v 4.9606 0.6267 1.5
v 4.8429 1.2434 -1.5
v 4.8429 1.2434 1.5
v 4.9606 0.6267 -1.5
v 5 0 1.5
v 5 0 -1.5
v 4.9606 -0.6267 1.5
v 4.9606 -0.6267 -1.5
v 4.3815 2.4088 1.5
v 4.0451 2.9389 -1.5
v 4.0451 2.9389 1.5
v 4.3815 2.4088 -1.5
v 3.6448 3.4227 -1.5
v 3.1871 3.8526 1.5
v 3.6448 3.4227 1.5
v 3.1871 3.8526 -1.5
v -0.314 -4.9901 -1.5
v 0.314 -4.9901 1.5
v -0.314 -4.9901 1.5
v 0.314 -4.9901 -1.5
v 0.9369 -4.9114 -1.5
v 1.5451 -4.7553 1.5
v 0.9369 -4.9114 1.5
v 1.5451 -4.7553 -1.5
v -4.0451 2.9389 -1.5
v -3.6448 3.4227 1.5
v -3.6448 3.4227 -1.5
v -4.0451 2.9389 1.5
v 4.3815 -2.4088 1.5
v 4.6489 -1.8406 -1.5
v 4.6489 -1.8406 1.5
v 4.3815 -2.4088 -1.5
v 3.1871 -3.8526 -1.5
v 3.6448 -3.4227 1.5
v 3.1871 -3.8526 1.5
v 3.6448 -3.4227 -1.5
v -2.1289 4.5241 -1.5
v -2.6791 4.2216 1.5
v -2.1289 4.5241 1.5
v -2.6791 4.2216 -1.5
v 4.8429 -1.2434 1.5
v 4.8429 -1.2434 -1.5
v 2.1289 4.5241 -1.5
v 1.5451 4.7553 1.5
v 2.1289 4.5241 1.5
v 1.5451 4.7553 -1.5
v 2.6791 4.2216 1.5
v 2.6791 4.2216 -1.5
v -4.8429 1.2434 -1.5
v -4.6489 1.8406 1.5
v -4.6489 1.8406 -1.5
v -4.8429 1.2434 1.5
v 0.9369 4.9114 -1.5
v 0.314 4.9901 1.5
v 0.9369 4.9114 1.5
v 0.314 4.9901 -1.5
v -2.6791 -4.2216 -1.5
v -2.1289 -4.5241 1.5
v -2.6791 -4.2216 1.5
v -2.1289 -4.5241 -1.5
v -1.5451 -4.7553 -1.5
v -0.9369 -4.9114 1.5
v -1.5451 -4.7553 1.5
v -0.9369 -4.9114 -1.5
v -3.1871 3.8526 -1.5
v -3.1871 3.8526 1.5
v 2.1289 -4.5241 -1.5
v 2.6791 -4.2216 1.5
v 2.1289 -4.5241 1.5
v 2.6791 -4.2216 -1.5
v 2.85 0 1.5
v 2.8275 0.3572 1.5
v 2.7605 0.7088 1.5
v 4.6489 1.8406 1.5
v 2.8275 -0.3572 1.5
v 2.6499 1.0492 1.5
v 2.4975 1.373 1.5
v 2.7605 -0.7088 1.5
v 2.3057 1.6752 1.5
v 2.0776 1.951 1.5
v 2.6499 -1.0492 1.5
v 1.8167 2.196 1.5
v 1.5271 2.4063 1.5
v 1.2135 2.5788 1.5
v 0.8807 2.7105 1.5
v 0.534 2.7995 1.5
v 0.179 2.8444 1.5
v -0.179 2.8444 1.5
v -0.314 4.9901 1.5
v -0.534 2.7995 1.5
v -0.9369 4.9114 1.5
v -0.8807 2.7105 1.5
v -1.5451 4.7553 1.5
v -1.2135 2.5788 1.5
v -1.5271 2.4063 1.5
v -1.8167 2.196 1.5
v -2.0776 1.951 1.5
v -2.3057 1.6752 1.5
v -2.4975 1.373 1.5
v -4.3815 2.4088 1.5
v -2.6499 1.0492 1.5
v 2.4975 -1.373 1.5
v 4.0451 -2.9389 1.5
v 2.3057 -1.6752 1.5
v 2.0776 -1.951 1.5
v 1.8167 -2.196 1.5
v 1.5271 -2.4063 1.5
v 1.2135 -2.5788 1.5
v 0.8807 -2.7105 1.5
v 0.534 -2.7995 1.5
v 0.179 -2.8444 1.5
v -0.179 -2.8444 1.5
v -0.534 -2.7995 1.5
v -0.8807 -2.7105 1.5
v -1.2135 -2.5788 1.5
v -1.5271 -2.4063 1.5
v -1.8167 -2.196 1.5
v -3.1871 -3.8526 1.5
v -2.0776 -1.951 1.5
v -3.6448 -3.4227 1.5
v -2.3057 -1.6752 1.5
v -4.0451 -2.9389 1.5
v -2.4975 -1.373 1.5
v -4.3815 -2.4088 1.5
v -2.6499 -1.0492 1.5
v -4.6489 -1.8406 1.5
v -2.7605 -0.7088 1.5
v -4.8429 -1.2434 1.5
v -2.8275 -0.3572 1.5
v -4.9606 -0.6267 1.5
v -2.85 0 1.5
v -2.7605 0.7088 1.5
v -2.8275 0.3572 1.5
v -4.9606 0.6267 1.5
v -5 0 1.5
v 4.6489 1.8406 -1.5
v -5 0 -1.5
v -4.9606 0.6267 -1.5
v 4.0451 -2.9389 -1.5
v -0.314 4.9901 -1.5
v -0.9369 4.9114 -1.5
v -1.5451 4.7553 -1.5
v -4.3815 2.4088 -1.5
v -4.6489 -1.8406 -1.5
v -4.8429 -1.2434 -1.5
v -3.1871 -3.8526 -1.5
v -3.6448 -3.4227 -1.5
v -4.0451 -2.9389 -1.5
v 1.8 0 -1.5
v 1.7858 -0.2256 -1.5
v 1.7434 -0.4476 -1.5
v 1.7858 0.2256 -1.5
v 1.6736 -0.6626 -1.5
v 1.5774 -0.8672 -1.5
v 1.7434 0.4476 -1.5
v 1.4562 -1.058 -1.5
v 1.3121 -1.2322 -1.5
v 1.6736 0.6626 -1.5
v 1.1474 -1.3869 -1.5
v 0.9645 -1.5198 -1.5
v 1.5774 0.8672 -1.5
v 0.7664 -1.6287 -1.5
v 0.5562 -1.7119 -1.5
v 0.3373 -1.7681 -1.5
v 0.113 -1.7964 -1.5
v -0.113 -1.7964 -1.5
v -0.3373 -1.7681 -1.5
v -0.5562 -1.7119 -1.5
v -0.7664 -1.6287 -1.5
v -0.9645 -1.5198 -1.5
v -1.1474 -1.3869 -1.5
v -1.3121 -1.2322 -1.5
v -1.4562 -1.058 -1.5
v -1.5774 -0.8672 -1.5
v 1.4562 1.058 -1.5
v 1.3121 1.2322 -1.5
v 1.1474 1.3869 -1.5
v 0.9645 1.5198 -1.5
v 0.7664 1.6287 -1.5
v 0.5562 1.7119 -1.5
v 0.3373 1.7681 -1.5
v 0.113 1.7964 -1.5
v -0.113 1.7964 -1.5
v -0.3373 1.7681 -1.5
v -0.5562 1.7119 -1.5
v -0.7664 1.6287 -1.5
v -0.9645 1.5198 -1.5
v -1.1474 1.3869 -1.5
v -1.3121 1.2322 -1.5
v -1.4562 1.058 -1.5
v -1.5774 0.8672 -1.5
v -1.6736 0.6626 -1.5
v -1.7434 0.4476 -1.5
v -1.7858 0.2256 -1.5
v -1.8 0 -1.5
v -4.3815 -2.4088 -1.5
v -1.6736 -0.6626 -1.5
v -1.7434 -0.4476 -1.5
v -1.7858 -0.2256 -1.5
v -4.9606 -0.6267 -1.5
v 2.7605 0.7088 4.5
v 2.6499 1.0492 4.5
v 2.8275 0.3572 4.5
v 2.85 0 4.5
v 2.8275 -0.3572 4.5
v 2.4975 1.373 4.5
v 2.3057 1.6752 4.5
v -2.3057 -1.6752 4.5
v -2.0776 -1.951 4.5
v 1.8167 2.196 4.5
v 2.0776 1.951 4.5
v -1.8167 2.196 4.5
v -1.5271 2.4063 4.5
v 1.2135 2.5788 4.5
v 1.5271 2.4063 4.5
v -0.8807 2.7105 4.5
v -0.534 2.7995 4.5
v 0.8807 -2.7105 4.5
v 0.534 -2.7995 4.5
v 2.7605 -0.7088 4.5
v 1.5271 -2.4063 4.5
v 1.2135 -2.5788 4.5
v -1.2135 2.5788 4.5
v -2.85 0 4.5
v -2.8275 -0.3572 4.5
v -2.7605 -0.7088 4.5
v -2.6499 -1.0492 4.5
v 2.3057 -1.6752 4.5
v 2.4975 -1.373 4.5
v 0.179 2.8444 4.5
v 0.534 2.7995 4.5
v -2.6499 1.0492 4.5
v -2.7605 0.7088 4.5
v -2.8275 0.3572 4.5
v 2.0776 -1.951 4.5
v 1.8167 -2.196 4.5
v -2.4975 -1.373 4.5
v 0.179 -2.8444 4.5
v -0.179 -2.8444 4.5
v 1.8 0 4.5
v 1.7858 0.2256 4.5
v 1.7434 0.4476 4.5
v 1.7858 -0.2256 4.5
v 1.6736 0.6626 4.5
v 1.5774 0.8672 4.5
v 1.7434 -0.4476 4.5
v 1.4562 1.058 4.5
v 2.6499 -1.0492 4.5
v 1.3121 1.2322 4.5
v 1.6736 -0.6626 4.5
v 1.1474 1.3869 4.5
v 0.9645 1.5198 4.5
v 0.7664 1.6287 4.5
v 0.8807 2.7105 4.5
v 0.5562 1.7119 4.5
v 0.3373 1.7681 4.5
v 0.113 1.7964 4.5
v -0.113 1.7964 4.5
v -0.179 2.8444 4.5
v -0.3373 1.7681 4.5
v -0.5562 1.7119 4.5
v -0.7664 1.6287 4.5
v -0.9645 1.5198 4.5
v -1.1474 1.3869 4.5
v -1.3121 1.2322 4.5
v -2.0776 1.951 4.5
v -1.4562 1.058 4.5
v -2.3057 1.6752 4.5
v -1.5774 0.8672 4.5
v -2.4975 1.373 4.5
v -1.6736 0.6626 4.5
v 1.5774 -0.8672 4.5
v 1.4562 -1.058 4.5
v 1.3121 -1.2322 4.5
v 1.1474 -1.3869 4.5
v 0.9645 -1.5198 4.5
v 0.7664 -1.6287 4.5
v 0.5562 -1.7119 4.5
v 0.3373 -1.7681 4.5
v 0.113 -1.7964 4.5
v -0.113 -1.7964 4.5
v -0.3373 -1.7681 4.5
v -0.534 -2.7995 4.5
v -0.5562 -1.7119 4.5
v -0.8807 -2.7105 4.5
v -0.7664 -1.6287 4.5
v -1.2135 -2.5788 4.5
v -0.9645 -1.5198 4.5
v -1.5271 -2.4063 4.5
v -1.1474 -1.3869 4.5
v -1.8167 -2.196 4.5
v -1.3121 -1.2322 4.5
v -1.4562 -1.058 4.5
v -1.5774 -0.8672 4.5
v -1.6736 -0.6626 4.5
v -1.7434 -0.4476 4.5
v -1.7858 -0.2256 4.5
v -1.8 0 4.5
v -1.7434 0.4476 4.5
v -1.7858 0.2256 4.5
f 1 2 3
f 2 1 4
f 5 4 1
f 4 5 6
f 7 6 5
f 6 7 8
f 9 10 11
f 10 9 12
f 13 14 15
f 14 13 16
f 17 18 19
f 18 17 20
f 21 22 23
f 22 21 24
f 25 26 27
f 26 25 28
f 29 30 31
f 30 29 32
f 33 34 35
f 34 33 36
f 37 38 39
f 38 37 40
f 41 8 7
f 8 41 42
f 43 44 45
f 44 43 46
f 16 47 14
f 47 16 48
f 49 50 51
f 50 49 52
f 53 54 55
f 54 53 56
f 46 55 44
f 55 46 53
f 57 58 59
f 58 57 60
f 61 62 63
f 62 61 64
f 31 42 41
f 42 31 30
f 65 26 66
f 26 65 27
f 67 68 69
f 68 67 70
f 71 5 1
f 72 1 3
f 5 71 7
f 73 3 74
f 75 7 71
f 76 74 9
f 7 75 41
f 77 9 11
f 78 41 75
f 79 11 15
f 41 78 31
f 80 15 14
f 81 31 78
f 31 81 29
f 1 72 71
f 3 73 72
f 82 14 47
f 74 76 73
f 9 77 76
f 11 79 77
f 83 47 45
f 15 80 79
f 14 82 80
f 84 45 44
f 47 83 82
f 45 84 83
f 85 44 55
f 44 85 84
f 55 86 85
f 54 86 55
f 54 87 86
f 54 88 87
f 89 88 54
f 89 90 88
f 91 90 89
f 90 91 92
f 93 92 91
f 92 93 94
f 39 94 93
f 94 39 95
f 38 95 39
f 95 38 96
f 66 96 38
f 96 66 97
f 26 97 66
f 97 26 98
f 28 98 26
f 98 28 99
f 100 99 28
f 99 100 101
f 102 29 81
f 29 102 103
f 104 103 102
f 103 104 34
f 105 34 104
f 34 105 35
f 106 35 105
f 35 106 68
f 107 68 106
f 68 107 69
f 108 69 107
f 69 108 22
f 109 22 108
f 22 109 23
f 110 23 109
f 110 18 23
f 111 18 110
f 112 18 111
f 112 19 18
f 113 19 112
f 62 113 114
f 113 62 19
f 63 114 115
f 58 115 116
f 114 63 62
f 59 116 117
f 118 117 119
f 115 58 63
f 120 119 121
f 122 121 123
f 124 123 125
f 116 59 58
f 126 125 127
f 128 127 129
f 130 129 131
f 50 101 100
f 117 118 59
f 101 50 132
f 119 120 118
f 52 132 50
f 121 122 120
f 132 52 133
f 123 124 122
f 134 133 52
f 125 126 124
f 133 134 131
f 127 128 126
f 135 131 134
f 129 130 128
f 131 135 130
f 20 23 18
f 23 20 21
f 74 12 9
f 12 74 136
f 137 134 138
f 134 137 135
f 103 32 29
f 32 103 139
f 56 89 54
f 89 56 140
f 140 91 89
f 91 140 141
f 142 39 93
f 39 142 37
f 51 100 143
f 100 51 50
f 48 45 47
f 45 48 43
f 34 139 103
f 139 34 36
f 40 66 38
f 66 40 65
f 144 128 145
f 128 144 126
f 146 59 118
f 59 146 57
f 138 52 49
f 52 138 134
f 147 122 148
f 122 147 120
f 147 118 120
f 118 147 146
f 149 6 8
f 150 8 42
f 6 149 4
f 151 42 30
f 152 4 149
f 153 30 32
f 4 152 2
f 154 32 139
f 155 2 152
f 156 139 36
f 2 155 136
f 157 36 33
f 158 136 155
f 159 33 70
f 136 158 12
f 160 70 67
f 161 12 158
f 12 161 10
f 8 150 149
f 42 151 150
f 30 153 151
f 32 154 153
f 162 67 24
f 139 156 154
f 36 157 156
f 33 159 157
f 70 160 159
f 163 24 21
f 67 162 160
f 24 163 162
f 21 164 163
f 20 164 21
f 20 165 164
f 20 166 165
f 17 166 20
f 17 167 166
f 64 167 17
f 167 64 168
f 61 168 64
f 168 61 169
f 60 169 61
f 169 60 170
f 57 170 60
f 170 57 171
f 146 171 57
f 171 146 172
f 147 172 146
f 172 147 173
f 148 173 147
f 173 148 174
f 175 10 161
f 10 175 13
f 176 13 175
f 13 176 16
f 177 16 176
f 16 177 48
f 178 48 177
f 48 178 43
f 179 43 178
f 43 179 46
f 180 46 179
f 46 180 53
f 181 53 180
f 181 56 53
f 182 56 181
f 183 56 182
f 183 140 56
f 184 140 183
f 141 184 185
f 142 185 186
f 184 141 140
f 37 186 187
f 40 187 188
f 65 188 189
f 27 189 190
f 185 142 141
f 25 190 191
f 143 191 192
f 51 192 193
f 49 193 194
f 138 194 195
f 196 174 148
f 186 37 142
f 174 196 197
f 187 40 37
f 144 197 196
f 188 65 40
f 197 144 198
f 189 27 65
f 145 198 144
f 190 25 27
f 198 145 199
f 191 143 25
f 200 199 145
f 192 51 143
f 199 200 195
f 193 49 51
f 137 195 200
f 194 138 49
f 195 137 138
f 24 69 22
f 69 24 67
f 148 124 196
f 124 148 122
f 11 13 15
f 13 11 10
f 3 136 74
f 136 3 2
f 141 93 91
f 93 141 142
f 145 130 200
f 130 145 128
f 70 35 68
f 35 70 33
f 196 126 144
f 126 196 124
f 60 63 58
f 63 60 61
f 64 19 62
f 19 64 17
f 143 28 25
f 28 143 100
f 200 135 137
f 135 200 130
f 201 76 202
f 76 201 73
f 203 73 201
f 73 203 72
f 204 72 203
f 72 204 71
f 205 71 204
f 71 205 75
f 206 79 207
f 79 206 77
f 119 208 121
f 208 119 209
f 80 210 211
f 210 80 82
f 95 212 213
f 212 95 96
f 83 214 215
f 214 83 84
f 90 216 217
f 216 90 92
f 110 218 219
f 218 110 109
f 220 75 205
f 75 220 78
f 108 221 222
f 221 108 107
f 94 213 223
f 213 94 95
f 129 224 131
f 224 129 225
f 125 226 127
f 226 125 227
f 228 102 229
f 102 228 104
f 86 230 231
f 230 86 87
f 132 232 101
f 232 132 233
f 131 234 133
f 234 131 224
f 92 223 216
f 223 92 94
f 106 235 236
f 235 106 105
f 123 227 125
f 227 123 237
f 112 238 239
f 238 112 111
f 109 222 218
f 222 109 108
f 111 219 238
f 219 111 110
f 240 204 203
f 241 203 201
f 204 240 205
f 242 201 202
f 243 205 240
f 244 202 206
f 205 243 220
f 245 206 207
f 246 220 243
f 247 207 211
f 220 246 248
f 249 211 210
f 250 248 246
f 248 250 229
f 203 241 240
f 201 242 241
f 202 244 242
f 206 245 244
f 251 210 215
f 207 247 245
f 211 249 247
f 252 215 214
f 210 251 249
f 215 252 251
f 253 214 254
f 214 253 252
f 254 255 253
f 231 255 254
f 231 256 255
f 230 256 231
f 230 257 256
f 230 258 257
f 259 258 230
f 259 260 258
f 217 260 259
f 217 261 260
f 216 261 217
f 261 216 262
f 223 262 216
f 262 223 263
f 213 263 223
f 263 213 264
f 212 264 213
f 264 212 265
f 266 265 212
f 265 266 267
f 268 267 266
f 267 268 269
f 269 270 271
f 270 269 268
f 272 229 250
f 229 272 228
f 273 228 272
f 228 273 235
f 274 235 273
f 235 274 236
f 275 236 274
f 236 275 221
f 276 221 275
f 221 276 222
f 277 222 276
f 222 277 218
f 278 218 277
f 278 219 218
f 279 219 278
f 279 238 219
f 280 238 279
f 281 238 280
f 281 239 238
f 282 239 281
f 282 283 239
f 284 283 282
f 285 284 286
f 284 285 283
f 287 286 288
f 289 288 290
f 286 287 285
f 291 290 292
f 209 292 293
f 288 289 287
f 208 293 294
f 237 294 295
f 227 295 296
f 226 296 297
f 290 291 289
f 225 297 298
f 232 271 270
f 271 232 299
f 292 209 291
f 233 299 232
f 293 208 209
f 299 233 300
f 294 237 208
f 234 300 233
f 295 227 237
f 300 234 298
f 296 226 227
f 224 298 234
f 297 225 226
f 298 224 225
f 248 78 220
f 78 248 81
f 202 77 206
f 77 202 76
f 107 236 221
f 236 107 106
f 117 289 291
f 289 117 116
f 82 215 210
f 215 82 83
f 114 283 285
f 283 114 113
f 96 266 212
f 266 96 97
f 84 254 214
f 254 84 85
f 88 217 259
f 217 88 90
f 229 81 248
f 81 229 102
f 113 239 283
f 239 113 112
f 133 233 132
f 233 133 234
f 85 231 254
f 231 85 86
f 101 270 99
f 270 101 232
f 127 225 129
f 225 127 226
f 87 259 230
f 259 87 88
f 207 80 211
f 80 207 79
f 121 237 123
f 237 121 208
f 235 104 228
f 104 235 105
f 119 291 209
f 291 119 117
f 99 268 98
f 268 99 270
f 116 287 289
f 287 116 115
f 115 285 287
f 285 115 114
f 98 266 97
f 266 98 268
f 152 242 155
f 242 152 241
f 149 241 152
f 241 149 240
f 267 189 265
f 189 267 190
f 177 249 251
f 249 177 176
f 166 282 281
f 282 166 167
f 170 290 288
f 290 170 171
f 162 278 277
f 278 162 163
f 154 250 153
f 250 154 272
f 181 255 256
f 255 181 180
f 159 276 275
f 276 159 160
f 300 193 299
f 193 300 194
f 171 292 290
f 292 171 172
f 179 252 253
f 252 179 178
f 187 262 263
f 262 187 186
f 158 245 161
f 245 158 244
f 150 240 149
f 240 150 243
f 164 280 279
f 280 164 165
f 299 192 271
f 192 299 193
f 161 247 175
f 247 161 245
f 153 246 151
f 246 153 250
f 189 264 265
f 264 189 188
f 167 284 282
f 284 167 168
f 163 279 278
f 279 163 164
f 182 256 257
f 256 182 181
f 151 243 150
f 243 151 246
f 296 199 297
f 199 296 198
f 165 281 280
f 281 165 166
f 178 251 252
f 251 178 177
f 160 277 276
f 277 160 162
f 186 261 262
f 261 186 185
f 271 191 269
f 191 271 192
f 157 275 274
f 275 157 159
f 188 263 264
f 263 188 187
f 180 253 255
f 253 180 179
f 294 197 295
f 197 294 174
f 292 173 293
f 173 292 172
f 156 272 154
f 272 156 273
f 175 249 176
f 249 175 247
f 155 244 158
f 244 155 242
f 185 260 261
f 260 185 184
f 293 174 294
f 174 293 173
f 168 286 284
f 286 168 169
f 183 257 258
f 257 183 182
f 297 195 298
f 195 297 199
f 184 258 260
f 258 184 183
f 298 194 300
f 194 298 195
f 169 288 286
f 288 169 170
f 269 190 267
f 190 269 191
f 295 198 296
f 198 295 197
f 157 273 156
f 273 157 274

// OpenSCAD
$fn = 50;


difference() {
	union() {
		translate(v = [0, 0, -1.5000000000]) {
			cylinder(h = 3, r = 5.0000000000);
		}
		translate(v = [0, 0, -1.5000000000]) {
			cylinder(h = 6, r = 2.8500000000);
		}
	}
	union() {
		translate(v = [0, 0, -100.0000000000]) {
			cylinder(h = 200, r = 1.8000000000);
		}
	}
}
